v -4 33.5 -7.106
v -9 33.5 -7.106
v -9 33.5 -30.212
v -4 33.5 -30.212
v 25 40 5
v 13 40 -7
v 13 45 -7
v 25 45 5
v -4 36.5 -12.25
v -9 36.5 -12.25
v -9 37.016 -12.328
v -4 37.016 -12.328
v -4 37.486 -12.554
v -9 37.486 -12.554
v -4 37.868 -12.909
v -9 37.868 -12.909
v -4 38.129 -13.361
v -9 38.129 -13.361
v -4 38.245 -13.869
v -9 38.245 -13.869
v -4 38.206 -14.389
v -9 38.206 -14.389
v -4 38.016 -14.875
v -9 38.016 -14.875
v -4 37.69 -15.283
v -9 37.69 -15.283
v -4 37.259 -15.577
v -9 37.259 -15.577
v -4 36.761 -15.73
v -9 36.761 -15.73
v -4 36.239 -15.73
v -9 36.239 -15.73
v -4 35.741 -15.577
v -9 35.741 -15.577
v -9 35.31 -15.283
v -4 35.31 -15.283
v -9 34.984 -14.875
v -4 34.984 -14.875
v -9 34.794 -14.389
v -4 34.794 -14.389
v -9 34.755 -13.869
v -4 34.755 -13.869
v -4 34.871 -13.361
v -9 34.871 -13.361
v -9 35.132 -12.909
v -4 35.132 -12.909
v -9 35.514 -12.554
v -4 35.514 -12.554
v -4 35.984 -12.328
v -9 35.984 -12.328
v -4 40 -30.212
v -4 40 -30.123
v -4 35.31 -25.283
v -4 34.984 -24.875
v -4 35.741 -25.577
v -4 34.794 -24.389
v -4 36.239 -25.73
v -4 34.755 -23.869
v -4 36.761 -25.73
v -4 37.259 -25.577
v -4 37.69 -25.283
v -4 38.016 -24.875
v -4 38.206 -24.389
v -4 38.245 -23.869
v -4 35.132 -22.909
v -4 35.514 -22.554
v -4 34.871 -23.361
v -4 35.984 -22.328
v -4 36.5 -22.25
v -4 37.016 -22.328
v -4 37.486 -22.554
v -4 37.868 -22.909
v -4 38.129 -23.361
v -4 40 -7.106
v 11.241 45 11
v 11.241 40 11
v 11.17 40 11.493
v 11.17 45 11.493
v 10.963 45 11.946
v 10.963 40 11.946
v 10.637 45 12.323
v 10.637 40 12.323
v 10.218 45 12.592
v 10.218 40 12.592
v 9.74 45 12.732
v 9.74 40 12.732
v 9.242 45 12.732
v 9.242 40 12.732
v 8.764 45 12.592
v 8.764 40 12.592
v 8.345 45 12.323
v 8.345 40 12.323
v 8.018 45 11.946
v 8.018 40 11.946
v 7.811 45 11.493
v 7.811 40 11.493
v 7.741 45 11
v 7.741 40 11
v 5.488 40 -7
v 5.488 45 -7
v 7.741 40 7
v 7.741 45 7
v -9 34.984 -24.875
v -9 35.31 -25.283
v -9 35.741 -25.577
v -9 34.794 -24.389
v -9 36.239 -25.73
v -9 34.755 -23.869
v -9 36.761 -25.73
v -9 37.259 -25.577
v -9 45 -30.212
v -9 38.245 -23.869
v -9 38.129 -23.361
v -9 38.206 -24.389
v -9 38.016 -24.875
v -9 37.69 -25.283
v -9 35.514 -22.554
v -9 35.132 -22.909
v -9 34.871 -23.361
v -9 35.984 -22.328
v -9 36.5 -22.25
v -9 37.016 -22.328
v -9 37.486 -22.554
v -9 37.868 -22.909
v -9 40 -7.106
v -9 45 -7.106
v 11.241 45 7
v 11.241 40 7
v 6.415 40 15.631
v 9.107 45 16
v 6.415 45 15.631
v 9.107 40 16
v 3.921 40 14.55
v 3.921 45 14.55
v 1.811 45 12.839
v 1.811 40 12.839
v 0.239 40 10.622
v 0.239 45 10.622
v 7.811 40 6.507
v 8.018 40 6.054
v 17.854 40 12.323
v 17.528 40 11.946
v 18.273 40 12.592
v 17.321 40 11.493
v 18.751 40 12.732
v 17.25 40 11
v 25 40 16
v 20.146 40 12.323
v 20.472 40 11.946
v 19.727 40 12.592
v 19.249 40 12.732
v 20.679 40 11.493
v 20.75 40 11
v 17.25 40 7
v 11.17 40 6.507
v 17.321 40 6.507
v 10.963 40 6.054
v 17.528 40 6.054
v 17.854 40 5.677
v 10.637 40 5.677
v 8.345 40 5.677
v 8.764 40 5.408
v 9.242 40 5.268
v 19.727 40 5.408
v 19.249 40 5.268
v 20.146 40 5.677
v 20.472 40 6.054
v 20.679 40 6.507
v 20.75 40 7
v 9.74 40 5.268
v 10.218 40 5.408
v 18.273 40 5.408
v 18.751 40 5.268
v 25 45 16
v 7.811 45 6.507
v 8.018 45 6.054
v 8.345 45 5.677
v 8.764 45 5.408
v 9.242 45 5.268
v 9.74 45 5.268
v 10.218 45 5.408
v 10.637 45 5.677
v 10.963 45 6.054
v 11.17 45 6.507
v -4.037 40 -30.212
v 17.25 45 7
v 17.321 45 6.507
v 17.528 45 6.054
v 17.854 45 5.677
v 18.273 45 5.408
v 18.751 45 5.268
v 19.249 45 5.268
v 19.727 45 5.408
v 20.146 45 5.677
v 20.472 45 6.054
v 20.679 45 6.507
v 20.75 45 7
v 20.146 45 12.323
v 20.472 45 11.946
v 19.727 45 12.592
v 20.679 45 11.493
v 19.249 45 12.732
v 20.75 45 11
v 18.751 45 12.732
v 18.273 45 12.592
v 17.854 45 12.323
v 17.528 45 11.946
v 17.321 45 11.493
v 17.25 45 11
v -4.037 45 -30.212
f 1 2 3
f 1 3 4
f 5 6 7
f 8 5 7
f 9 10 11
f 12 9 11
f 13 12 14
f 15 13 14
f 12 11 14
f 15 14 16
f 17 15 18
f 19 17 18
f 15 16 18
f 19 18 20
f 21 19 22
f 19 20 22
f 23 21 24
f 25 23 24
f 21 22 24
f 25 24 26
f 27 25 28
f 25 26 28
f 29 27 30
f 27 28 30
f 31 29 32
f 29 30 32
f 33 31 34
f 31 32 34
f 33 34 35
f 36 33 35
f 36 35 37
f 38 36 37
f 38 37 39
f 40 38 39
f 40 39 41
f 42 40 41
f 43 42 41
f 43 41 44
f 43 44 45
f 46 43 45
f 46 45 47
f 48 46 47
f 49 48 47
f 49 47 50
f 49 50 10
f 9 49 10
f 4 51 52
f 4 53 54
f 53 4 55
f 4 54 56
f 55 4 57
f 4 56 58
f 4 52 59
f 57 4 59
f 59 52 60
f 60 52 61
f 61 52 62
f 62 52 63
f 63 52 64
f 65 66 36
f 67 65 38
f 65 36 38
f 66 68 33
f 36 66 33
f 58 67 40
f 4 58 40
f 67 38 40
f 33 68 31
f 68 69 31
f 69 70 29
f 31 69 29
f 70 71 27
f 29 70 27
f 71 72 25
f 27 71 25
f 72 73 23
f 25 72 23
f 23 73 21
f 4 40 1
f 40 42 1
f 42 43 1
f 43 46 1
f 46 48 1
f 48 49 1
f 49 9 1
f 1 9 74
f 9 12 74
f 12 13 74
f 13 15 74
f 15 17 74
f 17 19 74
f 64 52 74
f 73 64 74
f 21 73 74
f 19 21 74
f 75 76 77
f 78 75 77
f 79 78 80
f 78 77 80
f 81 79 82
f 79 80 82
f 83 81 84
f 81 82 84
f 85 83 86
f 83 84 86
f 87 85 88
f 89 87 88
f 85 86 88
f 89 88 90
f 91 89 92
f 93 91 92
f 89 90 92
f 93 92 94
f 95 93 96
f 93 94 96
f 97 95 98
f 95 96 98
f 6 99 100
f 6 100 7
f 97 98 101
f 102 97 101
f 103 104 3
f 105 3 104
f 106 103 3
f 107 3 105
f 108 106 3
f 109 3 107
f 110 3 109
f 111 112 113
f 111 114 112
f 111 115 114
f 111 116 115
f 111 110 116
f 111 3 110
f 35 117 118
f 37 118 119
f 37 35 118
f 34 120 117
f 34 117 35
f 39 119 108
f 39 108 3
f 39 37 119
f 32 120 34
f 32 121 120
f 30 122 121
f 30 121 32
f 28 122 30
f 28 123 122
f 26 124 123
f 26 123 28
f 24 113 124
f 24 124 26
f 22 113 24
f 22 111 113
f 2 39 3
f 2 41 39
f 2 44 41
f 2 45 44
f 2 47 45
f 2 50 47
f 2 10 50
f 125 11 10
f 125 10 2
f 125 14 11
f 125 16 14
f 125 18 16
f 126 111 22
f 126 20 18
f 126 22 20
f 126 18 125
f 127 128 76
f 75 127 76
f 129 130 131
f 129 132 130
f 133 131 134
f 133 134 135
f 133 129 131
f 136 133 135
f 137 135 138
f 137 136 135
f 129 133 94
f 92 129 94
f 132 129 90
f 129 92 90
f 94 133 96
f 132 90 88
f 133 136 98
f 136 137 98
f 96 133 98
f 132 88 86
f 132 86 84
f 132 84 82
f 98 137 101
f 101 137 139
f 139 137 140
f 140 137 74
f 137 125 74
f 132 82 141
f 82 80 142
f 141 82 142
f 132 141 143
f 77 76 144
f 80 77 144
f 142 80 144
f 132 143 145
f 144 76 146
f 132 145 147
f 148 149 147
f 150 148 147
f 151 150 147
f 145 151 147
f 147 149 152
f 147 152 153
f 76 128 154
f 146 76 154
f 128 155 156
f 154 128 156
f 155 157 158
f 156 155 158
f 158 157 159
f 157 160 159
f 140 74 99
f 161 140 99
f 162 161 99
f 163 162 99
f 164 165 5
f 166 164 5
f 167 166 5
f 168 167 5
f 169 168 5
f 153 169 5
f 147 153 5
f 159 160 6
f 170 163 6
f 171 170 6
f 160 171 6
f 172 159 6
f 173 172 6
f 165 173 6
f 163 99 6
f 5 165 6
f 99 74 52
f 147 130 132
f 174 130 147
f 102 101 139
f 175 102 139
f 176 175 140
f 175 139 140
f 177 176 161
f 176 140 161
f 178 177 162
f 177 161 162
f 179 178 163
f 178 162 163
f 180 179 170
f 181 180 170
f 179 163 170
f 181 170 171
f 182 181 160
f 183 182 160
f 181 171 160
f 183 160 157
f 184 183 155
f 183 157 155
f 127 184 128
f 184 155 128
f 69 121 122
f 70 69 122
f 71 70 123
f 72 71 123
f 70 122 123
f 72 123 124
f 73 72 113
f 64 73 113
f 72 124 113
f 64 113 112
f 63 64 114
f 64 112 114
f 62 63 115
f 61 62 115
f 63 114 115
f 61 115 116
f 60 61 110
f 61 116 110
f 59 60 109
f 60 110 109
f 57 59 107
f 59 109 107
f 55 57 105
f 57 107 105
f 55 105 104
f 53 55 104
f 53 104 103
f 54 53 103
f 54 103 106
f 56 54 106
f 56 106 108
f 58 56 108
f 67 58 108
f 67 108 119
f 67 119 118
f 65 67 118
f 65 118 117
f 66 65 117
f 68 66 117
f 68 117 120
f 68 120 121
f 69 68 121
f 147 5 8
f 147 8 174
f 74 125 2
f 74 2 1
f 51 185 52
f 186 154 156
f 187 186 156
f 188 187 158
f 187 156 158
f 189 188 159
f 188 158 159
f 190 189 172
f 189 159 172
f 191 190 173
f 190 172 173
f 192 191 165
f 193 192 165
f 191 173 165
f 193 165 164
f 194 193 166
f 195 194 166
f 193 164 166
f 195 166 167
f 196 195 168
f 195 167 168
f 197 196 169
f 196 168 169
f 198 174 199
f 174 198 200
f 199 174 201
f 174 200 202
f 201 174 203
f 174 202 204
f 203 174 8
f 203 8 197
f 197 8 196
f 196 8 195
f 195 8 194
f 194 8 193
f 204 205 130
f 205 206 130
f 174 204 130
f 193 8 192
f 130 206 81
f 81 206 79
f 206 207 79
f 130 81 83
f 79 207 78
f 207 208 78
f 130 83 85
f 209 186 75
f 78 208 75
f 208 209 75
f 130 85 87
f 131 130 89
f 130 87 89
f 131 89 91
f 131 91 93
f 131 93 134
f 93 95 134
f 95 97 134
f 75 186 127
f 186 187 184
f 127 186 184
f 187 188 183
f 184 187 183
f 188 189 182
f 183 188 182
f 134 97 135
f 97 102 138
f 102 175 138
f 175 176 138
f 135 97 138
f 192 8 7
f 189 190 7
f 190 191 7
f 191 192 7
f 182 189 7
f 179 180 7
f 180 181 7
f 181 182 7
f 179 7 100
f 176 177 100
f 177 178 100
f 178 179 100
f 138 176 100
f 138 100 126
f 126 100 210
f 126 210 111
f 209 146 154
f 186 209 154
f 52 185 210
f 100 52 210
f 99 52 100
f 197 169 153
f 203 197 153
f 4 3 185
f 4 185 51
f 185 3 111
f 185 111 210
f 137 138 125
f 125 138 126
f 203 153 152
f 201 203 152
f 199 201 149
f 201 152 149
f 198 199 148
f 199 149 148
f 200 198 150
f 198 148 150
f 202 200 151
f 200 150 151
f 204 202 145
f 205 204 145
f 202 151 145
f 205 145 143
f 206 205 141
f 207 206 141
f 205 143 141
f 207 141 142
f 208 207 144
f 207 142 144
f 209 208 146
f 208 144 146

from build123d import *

# Parameters (mm, degrees)
ESTRUSIONE_ESTRUSIONE8_DEPTH = 5
SCHIZZO19_W                  = 5
SCHIZZO19_H                  = 46.212351189
ESTRUSIONE_ESTRUSIONE9_DEPTH = 6.5
SCHIZZO20_R                  = 1.75
TAGLIO_ESTRUSIONE9_DEPTH     = 6
TAGLIO_ESTRUSIONE13_DEPTH    = 21
SCHIZZO26_W                  = 5
SCHIZZO26_H                  = 6.5
TAGLIO_ESTRUSIONE15_DEPTH    = 21
RACCORDO1_R                  = 10
SMUSSO1_SIZE                 = 12


with BuildPart() as part:
    # Schizzo18 → Estrusione-Estrusione8 (new body)
    with BuildSketch(Plane(origin=(0, 40, 0), x_dir=(1, 0, 0), z_dir=(0, 1, 0))):
        Polygon((25, -16), (-9, -16), (-9, 30.212351189), (-4.036856652, 30.212351189), (5.487873038, 7), (25, 7), align=None)
        with BuildLine():
            Line((17.25, -11), (17.25, -7))
            ThreePointArc((17.25, -7), (19, -5.25), (20.75, -7))
            Line((20.75, -7), (20.75, -11))
            ThreePointArc((20.75, -11), (19, -12.75), (17.25, -11))
        make_face(mode=Mode.SUBTRACT)
        with BuildLine():
            Line((7.74056589, -11), (7.74056589, -7))
            ThreePointArc((7.74056589, -7), (9.49056589, -5.25), (11.24056589, -7))
            Line((11.24056589, -7), (11.24056589, -11))
            ThreePointArc((11.24056589, -11), (9.49056589, -12.75), (7.74056589, -11))
        make_face(mode=Mode.SUBTRACT)
    extrude(amount=ESTRUSIONE_ESTRUSIONE8_DEPTH)

    # Schizzo19 → Estrusione-Estrusione9 (add)
    with BuildSketch(Plane.XZ.offset(-40)):
        with Locations((-6.5, -7.106175595)):
            Rectangle(SCHIZZO19_W, SCHIZZO19_H)
    extrude(amount=ESTRUSIONE_ESTRUSIONE9_DEPTH)

    # Schizzo20 → Taglio-Estrusione9 (cut)
    with BuildSketch(Plane.ZY.offset(9)):
        with Locations((-24, 36.5)):
            Circle(SCHIZZO20_R)
        with Locations((-14, 36.5)):
            Circle(SCHIZZO20_R)
    extrude(amount=-TAGLIO_ESTRUSIONE9_DEPTH, mode=Mode.SUBTRACT)

    # Schizzo24 → Taglio-Estrusione13 (cut)
    with BuildSketch(Plane(origin=(0, 45, 0), x_dir=(1, 0, 0), z_dir=(0, 1, 0))):
        Polygon((3.042265575, -16), (-9, 7.106175595), (-9, -16), align=None)
    extrude(amount=-TAGLIO_ESTRUSIONE13_DEPTH, mode=Mode.SUBTRACT)

    # Schizzo26 → Taglio-Estrusione15 (cut)
    with BuildSketch(Plane.XY.offset(-7.106175595)):
        with Locations((-6.5, 36.75)):
            Rectangle(SCHIZZO26_W, SCHIZZO26_H)
    extrude(amount=TAGLIO_ESTRUSIONE15_DEPTH, mode=Mode.SUBTRACT)

    # Raccordo1
    raccordo1_edges = [part.edges().sort_by_distance(p)[0] for p in [
        (3.042265575, 42.5, 16),
    ]]
    fillet(raccordo1_edges, radius=RACCORDO1_R)

    # Smusso1
    smusso1_edges = [part.edges().sort_by_distance(p)[0] for p in [
        (25, 42.5, -7),
    ]]
    chamfer(smusso1_edges, length=SMUSSO1_SIZE)


solid = part.part
